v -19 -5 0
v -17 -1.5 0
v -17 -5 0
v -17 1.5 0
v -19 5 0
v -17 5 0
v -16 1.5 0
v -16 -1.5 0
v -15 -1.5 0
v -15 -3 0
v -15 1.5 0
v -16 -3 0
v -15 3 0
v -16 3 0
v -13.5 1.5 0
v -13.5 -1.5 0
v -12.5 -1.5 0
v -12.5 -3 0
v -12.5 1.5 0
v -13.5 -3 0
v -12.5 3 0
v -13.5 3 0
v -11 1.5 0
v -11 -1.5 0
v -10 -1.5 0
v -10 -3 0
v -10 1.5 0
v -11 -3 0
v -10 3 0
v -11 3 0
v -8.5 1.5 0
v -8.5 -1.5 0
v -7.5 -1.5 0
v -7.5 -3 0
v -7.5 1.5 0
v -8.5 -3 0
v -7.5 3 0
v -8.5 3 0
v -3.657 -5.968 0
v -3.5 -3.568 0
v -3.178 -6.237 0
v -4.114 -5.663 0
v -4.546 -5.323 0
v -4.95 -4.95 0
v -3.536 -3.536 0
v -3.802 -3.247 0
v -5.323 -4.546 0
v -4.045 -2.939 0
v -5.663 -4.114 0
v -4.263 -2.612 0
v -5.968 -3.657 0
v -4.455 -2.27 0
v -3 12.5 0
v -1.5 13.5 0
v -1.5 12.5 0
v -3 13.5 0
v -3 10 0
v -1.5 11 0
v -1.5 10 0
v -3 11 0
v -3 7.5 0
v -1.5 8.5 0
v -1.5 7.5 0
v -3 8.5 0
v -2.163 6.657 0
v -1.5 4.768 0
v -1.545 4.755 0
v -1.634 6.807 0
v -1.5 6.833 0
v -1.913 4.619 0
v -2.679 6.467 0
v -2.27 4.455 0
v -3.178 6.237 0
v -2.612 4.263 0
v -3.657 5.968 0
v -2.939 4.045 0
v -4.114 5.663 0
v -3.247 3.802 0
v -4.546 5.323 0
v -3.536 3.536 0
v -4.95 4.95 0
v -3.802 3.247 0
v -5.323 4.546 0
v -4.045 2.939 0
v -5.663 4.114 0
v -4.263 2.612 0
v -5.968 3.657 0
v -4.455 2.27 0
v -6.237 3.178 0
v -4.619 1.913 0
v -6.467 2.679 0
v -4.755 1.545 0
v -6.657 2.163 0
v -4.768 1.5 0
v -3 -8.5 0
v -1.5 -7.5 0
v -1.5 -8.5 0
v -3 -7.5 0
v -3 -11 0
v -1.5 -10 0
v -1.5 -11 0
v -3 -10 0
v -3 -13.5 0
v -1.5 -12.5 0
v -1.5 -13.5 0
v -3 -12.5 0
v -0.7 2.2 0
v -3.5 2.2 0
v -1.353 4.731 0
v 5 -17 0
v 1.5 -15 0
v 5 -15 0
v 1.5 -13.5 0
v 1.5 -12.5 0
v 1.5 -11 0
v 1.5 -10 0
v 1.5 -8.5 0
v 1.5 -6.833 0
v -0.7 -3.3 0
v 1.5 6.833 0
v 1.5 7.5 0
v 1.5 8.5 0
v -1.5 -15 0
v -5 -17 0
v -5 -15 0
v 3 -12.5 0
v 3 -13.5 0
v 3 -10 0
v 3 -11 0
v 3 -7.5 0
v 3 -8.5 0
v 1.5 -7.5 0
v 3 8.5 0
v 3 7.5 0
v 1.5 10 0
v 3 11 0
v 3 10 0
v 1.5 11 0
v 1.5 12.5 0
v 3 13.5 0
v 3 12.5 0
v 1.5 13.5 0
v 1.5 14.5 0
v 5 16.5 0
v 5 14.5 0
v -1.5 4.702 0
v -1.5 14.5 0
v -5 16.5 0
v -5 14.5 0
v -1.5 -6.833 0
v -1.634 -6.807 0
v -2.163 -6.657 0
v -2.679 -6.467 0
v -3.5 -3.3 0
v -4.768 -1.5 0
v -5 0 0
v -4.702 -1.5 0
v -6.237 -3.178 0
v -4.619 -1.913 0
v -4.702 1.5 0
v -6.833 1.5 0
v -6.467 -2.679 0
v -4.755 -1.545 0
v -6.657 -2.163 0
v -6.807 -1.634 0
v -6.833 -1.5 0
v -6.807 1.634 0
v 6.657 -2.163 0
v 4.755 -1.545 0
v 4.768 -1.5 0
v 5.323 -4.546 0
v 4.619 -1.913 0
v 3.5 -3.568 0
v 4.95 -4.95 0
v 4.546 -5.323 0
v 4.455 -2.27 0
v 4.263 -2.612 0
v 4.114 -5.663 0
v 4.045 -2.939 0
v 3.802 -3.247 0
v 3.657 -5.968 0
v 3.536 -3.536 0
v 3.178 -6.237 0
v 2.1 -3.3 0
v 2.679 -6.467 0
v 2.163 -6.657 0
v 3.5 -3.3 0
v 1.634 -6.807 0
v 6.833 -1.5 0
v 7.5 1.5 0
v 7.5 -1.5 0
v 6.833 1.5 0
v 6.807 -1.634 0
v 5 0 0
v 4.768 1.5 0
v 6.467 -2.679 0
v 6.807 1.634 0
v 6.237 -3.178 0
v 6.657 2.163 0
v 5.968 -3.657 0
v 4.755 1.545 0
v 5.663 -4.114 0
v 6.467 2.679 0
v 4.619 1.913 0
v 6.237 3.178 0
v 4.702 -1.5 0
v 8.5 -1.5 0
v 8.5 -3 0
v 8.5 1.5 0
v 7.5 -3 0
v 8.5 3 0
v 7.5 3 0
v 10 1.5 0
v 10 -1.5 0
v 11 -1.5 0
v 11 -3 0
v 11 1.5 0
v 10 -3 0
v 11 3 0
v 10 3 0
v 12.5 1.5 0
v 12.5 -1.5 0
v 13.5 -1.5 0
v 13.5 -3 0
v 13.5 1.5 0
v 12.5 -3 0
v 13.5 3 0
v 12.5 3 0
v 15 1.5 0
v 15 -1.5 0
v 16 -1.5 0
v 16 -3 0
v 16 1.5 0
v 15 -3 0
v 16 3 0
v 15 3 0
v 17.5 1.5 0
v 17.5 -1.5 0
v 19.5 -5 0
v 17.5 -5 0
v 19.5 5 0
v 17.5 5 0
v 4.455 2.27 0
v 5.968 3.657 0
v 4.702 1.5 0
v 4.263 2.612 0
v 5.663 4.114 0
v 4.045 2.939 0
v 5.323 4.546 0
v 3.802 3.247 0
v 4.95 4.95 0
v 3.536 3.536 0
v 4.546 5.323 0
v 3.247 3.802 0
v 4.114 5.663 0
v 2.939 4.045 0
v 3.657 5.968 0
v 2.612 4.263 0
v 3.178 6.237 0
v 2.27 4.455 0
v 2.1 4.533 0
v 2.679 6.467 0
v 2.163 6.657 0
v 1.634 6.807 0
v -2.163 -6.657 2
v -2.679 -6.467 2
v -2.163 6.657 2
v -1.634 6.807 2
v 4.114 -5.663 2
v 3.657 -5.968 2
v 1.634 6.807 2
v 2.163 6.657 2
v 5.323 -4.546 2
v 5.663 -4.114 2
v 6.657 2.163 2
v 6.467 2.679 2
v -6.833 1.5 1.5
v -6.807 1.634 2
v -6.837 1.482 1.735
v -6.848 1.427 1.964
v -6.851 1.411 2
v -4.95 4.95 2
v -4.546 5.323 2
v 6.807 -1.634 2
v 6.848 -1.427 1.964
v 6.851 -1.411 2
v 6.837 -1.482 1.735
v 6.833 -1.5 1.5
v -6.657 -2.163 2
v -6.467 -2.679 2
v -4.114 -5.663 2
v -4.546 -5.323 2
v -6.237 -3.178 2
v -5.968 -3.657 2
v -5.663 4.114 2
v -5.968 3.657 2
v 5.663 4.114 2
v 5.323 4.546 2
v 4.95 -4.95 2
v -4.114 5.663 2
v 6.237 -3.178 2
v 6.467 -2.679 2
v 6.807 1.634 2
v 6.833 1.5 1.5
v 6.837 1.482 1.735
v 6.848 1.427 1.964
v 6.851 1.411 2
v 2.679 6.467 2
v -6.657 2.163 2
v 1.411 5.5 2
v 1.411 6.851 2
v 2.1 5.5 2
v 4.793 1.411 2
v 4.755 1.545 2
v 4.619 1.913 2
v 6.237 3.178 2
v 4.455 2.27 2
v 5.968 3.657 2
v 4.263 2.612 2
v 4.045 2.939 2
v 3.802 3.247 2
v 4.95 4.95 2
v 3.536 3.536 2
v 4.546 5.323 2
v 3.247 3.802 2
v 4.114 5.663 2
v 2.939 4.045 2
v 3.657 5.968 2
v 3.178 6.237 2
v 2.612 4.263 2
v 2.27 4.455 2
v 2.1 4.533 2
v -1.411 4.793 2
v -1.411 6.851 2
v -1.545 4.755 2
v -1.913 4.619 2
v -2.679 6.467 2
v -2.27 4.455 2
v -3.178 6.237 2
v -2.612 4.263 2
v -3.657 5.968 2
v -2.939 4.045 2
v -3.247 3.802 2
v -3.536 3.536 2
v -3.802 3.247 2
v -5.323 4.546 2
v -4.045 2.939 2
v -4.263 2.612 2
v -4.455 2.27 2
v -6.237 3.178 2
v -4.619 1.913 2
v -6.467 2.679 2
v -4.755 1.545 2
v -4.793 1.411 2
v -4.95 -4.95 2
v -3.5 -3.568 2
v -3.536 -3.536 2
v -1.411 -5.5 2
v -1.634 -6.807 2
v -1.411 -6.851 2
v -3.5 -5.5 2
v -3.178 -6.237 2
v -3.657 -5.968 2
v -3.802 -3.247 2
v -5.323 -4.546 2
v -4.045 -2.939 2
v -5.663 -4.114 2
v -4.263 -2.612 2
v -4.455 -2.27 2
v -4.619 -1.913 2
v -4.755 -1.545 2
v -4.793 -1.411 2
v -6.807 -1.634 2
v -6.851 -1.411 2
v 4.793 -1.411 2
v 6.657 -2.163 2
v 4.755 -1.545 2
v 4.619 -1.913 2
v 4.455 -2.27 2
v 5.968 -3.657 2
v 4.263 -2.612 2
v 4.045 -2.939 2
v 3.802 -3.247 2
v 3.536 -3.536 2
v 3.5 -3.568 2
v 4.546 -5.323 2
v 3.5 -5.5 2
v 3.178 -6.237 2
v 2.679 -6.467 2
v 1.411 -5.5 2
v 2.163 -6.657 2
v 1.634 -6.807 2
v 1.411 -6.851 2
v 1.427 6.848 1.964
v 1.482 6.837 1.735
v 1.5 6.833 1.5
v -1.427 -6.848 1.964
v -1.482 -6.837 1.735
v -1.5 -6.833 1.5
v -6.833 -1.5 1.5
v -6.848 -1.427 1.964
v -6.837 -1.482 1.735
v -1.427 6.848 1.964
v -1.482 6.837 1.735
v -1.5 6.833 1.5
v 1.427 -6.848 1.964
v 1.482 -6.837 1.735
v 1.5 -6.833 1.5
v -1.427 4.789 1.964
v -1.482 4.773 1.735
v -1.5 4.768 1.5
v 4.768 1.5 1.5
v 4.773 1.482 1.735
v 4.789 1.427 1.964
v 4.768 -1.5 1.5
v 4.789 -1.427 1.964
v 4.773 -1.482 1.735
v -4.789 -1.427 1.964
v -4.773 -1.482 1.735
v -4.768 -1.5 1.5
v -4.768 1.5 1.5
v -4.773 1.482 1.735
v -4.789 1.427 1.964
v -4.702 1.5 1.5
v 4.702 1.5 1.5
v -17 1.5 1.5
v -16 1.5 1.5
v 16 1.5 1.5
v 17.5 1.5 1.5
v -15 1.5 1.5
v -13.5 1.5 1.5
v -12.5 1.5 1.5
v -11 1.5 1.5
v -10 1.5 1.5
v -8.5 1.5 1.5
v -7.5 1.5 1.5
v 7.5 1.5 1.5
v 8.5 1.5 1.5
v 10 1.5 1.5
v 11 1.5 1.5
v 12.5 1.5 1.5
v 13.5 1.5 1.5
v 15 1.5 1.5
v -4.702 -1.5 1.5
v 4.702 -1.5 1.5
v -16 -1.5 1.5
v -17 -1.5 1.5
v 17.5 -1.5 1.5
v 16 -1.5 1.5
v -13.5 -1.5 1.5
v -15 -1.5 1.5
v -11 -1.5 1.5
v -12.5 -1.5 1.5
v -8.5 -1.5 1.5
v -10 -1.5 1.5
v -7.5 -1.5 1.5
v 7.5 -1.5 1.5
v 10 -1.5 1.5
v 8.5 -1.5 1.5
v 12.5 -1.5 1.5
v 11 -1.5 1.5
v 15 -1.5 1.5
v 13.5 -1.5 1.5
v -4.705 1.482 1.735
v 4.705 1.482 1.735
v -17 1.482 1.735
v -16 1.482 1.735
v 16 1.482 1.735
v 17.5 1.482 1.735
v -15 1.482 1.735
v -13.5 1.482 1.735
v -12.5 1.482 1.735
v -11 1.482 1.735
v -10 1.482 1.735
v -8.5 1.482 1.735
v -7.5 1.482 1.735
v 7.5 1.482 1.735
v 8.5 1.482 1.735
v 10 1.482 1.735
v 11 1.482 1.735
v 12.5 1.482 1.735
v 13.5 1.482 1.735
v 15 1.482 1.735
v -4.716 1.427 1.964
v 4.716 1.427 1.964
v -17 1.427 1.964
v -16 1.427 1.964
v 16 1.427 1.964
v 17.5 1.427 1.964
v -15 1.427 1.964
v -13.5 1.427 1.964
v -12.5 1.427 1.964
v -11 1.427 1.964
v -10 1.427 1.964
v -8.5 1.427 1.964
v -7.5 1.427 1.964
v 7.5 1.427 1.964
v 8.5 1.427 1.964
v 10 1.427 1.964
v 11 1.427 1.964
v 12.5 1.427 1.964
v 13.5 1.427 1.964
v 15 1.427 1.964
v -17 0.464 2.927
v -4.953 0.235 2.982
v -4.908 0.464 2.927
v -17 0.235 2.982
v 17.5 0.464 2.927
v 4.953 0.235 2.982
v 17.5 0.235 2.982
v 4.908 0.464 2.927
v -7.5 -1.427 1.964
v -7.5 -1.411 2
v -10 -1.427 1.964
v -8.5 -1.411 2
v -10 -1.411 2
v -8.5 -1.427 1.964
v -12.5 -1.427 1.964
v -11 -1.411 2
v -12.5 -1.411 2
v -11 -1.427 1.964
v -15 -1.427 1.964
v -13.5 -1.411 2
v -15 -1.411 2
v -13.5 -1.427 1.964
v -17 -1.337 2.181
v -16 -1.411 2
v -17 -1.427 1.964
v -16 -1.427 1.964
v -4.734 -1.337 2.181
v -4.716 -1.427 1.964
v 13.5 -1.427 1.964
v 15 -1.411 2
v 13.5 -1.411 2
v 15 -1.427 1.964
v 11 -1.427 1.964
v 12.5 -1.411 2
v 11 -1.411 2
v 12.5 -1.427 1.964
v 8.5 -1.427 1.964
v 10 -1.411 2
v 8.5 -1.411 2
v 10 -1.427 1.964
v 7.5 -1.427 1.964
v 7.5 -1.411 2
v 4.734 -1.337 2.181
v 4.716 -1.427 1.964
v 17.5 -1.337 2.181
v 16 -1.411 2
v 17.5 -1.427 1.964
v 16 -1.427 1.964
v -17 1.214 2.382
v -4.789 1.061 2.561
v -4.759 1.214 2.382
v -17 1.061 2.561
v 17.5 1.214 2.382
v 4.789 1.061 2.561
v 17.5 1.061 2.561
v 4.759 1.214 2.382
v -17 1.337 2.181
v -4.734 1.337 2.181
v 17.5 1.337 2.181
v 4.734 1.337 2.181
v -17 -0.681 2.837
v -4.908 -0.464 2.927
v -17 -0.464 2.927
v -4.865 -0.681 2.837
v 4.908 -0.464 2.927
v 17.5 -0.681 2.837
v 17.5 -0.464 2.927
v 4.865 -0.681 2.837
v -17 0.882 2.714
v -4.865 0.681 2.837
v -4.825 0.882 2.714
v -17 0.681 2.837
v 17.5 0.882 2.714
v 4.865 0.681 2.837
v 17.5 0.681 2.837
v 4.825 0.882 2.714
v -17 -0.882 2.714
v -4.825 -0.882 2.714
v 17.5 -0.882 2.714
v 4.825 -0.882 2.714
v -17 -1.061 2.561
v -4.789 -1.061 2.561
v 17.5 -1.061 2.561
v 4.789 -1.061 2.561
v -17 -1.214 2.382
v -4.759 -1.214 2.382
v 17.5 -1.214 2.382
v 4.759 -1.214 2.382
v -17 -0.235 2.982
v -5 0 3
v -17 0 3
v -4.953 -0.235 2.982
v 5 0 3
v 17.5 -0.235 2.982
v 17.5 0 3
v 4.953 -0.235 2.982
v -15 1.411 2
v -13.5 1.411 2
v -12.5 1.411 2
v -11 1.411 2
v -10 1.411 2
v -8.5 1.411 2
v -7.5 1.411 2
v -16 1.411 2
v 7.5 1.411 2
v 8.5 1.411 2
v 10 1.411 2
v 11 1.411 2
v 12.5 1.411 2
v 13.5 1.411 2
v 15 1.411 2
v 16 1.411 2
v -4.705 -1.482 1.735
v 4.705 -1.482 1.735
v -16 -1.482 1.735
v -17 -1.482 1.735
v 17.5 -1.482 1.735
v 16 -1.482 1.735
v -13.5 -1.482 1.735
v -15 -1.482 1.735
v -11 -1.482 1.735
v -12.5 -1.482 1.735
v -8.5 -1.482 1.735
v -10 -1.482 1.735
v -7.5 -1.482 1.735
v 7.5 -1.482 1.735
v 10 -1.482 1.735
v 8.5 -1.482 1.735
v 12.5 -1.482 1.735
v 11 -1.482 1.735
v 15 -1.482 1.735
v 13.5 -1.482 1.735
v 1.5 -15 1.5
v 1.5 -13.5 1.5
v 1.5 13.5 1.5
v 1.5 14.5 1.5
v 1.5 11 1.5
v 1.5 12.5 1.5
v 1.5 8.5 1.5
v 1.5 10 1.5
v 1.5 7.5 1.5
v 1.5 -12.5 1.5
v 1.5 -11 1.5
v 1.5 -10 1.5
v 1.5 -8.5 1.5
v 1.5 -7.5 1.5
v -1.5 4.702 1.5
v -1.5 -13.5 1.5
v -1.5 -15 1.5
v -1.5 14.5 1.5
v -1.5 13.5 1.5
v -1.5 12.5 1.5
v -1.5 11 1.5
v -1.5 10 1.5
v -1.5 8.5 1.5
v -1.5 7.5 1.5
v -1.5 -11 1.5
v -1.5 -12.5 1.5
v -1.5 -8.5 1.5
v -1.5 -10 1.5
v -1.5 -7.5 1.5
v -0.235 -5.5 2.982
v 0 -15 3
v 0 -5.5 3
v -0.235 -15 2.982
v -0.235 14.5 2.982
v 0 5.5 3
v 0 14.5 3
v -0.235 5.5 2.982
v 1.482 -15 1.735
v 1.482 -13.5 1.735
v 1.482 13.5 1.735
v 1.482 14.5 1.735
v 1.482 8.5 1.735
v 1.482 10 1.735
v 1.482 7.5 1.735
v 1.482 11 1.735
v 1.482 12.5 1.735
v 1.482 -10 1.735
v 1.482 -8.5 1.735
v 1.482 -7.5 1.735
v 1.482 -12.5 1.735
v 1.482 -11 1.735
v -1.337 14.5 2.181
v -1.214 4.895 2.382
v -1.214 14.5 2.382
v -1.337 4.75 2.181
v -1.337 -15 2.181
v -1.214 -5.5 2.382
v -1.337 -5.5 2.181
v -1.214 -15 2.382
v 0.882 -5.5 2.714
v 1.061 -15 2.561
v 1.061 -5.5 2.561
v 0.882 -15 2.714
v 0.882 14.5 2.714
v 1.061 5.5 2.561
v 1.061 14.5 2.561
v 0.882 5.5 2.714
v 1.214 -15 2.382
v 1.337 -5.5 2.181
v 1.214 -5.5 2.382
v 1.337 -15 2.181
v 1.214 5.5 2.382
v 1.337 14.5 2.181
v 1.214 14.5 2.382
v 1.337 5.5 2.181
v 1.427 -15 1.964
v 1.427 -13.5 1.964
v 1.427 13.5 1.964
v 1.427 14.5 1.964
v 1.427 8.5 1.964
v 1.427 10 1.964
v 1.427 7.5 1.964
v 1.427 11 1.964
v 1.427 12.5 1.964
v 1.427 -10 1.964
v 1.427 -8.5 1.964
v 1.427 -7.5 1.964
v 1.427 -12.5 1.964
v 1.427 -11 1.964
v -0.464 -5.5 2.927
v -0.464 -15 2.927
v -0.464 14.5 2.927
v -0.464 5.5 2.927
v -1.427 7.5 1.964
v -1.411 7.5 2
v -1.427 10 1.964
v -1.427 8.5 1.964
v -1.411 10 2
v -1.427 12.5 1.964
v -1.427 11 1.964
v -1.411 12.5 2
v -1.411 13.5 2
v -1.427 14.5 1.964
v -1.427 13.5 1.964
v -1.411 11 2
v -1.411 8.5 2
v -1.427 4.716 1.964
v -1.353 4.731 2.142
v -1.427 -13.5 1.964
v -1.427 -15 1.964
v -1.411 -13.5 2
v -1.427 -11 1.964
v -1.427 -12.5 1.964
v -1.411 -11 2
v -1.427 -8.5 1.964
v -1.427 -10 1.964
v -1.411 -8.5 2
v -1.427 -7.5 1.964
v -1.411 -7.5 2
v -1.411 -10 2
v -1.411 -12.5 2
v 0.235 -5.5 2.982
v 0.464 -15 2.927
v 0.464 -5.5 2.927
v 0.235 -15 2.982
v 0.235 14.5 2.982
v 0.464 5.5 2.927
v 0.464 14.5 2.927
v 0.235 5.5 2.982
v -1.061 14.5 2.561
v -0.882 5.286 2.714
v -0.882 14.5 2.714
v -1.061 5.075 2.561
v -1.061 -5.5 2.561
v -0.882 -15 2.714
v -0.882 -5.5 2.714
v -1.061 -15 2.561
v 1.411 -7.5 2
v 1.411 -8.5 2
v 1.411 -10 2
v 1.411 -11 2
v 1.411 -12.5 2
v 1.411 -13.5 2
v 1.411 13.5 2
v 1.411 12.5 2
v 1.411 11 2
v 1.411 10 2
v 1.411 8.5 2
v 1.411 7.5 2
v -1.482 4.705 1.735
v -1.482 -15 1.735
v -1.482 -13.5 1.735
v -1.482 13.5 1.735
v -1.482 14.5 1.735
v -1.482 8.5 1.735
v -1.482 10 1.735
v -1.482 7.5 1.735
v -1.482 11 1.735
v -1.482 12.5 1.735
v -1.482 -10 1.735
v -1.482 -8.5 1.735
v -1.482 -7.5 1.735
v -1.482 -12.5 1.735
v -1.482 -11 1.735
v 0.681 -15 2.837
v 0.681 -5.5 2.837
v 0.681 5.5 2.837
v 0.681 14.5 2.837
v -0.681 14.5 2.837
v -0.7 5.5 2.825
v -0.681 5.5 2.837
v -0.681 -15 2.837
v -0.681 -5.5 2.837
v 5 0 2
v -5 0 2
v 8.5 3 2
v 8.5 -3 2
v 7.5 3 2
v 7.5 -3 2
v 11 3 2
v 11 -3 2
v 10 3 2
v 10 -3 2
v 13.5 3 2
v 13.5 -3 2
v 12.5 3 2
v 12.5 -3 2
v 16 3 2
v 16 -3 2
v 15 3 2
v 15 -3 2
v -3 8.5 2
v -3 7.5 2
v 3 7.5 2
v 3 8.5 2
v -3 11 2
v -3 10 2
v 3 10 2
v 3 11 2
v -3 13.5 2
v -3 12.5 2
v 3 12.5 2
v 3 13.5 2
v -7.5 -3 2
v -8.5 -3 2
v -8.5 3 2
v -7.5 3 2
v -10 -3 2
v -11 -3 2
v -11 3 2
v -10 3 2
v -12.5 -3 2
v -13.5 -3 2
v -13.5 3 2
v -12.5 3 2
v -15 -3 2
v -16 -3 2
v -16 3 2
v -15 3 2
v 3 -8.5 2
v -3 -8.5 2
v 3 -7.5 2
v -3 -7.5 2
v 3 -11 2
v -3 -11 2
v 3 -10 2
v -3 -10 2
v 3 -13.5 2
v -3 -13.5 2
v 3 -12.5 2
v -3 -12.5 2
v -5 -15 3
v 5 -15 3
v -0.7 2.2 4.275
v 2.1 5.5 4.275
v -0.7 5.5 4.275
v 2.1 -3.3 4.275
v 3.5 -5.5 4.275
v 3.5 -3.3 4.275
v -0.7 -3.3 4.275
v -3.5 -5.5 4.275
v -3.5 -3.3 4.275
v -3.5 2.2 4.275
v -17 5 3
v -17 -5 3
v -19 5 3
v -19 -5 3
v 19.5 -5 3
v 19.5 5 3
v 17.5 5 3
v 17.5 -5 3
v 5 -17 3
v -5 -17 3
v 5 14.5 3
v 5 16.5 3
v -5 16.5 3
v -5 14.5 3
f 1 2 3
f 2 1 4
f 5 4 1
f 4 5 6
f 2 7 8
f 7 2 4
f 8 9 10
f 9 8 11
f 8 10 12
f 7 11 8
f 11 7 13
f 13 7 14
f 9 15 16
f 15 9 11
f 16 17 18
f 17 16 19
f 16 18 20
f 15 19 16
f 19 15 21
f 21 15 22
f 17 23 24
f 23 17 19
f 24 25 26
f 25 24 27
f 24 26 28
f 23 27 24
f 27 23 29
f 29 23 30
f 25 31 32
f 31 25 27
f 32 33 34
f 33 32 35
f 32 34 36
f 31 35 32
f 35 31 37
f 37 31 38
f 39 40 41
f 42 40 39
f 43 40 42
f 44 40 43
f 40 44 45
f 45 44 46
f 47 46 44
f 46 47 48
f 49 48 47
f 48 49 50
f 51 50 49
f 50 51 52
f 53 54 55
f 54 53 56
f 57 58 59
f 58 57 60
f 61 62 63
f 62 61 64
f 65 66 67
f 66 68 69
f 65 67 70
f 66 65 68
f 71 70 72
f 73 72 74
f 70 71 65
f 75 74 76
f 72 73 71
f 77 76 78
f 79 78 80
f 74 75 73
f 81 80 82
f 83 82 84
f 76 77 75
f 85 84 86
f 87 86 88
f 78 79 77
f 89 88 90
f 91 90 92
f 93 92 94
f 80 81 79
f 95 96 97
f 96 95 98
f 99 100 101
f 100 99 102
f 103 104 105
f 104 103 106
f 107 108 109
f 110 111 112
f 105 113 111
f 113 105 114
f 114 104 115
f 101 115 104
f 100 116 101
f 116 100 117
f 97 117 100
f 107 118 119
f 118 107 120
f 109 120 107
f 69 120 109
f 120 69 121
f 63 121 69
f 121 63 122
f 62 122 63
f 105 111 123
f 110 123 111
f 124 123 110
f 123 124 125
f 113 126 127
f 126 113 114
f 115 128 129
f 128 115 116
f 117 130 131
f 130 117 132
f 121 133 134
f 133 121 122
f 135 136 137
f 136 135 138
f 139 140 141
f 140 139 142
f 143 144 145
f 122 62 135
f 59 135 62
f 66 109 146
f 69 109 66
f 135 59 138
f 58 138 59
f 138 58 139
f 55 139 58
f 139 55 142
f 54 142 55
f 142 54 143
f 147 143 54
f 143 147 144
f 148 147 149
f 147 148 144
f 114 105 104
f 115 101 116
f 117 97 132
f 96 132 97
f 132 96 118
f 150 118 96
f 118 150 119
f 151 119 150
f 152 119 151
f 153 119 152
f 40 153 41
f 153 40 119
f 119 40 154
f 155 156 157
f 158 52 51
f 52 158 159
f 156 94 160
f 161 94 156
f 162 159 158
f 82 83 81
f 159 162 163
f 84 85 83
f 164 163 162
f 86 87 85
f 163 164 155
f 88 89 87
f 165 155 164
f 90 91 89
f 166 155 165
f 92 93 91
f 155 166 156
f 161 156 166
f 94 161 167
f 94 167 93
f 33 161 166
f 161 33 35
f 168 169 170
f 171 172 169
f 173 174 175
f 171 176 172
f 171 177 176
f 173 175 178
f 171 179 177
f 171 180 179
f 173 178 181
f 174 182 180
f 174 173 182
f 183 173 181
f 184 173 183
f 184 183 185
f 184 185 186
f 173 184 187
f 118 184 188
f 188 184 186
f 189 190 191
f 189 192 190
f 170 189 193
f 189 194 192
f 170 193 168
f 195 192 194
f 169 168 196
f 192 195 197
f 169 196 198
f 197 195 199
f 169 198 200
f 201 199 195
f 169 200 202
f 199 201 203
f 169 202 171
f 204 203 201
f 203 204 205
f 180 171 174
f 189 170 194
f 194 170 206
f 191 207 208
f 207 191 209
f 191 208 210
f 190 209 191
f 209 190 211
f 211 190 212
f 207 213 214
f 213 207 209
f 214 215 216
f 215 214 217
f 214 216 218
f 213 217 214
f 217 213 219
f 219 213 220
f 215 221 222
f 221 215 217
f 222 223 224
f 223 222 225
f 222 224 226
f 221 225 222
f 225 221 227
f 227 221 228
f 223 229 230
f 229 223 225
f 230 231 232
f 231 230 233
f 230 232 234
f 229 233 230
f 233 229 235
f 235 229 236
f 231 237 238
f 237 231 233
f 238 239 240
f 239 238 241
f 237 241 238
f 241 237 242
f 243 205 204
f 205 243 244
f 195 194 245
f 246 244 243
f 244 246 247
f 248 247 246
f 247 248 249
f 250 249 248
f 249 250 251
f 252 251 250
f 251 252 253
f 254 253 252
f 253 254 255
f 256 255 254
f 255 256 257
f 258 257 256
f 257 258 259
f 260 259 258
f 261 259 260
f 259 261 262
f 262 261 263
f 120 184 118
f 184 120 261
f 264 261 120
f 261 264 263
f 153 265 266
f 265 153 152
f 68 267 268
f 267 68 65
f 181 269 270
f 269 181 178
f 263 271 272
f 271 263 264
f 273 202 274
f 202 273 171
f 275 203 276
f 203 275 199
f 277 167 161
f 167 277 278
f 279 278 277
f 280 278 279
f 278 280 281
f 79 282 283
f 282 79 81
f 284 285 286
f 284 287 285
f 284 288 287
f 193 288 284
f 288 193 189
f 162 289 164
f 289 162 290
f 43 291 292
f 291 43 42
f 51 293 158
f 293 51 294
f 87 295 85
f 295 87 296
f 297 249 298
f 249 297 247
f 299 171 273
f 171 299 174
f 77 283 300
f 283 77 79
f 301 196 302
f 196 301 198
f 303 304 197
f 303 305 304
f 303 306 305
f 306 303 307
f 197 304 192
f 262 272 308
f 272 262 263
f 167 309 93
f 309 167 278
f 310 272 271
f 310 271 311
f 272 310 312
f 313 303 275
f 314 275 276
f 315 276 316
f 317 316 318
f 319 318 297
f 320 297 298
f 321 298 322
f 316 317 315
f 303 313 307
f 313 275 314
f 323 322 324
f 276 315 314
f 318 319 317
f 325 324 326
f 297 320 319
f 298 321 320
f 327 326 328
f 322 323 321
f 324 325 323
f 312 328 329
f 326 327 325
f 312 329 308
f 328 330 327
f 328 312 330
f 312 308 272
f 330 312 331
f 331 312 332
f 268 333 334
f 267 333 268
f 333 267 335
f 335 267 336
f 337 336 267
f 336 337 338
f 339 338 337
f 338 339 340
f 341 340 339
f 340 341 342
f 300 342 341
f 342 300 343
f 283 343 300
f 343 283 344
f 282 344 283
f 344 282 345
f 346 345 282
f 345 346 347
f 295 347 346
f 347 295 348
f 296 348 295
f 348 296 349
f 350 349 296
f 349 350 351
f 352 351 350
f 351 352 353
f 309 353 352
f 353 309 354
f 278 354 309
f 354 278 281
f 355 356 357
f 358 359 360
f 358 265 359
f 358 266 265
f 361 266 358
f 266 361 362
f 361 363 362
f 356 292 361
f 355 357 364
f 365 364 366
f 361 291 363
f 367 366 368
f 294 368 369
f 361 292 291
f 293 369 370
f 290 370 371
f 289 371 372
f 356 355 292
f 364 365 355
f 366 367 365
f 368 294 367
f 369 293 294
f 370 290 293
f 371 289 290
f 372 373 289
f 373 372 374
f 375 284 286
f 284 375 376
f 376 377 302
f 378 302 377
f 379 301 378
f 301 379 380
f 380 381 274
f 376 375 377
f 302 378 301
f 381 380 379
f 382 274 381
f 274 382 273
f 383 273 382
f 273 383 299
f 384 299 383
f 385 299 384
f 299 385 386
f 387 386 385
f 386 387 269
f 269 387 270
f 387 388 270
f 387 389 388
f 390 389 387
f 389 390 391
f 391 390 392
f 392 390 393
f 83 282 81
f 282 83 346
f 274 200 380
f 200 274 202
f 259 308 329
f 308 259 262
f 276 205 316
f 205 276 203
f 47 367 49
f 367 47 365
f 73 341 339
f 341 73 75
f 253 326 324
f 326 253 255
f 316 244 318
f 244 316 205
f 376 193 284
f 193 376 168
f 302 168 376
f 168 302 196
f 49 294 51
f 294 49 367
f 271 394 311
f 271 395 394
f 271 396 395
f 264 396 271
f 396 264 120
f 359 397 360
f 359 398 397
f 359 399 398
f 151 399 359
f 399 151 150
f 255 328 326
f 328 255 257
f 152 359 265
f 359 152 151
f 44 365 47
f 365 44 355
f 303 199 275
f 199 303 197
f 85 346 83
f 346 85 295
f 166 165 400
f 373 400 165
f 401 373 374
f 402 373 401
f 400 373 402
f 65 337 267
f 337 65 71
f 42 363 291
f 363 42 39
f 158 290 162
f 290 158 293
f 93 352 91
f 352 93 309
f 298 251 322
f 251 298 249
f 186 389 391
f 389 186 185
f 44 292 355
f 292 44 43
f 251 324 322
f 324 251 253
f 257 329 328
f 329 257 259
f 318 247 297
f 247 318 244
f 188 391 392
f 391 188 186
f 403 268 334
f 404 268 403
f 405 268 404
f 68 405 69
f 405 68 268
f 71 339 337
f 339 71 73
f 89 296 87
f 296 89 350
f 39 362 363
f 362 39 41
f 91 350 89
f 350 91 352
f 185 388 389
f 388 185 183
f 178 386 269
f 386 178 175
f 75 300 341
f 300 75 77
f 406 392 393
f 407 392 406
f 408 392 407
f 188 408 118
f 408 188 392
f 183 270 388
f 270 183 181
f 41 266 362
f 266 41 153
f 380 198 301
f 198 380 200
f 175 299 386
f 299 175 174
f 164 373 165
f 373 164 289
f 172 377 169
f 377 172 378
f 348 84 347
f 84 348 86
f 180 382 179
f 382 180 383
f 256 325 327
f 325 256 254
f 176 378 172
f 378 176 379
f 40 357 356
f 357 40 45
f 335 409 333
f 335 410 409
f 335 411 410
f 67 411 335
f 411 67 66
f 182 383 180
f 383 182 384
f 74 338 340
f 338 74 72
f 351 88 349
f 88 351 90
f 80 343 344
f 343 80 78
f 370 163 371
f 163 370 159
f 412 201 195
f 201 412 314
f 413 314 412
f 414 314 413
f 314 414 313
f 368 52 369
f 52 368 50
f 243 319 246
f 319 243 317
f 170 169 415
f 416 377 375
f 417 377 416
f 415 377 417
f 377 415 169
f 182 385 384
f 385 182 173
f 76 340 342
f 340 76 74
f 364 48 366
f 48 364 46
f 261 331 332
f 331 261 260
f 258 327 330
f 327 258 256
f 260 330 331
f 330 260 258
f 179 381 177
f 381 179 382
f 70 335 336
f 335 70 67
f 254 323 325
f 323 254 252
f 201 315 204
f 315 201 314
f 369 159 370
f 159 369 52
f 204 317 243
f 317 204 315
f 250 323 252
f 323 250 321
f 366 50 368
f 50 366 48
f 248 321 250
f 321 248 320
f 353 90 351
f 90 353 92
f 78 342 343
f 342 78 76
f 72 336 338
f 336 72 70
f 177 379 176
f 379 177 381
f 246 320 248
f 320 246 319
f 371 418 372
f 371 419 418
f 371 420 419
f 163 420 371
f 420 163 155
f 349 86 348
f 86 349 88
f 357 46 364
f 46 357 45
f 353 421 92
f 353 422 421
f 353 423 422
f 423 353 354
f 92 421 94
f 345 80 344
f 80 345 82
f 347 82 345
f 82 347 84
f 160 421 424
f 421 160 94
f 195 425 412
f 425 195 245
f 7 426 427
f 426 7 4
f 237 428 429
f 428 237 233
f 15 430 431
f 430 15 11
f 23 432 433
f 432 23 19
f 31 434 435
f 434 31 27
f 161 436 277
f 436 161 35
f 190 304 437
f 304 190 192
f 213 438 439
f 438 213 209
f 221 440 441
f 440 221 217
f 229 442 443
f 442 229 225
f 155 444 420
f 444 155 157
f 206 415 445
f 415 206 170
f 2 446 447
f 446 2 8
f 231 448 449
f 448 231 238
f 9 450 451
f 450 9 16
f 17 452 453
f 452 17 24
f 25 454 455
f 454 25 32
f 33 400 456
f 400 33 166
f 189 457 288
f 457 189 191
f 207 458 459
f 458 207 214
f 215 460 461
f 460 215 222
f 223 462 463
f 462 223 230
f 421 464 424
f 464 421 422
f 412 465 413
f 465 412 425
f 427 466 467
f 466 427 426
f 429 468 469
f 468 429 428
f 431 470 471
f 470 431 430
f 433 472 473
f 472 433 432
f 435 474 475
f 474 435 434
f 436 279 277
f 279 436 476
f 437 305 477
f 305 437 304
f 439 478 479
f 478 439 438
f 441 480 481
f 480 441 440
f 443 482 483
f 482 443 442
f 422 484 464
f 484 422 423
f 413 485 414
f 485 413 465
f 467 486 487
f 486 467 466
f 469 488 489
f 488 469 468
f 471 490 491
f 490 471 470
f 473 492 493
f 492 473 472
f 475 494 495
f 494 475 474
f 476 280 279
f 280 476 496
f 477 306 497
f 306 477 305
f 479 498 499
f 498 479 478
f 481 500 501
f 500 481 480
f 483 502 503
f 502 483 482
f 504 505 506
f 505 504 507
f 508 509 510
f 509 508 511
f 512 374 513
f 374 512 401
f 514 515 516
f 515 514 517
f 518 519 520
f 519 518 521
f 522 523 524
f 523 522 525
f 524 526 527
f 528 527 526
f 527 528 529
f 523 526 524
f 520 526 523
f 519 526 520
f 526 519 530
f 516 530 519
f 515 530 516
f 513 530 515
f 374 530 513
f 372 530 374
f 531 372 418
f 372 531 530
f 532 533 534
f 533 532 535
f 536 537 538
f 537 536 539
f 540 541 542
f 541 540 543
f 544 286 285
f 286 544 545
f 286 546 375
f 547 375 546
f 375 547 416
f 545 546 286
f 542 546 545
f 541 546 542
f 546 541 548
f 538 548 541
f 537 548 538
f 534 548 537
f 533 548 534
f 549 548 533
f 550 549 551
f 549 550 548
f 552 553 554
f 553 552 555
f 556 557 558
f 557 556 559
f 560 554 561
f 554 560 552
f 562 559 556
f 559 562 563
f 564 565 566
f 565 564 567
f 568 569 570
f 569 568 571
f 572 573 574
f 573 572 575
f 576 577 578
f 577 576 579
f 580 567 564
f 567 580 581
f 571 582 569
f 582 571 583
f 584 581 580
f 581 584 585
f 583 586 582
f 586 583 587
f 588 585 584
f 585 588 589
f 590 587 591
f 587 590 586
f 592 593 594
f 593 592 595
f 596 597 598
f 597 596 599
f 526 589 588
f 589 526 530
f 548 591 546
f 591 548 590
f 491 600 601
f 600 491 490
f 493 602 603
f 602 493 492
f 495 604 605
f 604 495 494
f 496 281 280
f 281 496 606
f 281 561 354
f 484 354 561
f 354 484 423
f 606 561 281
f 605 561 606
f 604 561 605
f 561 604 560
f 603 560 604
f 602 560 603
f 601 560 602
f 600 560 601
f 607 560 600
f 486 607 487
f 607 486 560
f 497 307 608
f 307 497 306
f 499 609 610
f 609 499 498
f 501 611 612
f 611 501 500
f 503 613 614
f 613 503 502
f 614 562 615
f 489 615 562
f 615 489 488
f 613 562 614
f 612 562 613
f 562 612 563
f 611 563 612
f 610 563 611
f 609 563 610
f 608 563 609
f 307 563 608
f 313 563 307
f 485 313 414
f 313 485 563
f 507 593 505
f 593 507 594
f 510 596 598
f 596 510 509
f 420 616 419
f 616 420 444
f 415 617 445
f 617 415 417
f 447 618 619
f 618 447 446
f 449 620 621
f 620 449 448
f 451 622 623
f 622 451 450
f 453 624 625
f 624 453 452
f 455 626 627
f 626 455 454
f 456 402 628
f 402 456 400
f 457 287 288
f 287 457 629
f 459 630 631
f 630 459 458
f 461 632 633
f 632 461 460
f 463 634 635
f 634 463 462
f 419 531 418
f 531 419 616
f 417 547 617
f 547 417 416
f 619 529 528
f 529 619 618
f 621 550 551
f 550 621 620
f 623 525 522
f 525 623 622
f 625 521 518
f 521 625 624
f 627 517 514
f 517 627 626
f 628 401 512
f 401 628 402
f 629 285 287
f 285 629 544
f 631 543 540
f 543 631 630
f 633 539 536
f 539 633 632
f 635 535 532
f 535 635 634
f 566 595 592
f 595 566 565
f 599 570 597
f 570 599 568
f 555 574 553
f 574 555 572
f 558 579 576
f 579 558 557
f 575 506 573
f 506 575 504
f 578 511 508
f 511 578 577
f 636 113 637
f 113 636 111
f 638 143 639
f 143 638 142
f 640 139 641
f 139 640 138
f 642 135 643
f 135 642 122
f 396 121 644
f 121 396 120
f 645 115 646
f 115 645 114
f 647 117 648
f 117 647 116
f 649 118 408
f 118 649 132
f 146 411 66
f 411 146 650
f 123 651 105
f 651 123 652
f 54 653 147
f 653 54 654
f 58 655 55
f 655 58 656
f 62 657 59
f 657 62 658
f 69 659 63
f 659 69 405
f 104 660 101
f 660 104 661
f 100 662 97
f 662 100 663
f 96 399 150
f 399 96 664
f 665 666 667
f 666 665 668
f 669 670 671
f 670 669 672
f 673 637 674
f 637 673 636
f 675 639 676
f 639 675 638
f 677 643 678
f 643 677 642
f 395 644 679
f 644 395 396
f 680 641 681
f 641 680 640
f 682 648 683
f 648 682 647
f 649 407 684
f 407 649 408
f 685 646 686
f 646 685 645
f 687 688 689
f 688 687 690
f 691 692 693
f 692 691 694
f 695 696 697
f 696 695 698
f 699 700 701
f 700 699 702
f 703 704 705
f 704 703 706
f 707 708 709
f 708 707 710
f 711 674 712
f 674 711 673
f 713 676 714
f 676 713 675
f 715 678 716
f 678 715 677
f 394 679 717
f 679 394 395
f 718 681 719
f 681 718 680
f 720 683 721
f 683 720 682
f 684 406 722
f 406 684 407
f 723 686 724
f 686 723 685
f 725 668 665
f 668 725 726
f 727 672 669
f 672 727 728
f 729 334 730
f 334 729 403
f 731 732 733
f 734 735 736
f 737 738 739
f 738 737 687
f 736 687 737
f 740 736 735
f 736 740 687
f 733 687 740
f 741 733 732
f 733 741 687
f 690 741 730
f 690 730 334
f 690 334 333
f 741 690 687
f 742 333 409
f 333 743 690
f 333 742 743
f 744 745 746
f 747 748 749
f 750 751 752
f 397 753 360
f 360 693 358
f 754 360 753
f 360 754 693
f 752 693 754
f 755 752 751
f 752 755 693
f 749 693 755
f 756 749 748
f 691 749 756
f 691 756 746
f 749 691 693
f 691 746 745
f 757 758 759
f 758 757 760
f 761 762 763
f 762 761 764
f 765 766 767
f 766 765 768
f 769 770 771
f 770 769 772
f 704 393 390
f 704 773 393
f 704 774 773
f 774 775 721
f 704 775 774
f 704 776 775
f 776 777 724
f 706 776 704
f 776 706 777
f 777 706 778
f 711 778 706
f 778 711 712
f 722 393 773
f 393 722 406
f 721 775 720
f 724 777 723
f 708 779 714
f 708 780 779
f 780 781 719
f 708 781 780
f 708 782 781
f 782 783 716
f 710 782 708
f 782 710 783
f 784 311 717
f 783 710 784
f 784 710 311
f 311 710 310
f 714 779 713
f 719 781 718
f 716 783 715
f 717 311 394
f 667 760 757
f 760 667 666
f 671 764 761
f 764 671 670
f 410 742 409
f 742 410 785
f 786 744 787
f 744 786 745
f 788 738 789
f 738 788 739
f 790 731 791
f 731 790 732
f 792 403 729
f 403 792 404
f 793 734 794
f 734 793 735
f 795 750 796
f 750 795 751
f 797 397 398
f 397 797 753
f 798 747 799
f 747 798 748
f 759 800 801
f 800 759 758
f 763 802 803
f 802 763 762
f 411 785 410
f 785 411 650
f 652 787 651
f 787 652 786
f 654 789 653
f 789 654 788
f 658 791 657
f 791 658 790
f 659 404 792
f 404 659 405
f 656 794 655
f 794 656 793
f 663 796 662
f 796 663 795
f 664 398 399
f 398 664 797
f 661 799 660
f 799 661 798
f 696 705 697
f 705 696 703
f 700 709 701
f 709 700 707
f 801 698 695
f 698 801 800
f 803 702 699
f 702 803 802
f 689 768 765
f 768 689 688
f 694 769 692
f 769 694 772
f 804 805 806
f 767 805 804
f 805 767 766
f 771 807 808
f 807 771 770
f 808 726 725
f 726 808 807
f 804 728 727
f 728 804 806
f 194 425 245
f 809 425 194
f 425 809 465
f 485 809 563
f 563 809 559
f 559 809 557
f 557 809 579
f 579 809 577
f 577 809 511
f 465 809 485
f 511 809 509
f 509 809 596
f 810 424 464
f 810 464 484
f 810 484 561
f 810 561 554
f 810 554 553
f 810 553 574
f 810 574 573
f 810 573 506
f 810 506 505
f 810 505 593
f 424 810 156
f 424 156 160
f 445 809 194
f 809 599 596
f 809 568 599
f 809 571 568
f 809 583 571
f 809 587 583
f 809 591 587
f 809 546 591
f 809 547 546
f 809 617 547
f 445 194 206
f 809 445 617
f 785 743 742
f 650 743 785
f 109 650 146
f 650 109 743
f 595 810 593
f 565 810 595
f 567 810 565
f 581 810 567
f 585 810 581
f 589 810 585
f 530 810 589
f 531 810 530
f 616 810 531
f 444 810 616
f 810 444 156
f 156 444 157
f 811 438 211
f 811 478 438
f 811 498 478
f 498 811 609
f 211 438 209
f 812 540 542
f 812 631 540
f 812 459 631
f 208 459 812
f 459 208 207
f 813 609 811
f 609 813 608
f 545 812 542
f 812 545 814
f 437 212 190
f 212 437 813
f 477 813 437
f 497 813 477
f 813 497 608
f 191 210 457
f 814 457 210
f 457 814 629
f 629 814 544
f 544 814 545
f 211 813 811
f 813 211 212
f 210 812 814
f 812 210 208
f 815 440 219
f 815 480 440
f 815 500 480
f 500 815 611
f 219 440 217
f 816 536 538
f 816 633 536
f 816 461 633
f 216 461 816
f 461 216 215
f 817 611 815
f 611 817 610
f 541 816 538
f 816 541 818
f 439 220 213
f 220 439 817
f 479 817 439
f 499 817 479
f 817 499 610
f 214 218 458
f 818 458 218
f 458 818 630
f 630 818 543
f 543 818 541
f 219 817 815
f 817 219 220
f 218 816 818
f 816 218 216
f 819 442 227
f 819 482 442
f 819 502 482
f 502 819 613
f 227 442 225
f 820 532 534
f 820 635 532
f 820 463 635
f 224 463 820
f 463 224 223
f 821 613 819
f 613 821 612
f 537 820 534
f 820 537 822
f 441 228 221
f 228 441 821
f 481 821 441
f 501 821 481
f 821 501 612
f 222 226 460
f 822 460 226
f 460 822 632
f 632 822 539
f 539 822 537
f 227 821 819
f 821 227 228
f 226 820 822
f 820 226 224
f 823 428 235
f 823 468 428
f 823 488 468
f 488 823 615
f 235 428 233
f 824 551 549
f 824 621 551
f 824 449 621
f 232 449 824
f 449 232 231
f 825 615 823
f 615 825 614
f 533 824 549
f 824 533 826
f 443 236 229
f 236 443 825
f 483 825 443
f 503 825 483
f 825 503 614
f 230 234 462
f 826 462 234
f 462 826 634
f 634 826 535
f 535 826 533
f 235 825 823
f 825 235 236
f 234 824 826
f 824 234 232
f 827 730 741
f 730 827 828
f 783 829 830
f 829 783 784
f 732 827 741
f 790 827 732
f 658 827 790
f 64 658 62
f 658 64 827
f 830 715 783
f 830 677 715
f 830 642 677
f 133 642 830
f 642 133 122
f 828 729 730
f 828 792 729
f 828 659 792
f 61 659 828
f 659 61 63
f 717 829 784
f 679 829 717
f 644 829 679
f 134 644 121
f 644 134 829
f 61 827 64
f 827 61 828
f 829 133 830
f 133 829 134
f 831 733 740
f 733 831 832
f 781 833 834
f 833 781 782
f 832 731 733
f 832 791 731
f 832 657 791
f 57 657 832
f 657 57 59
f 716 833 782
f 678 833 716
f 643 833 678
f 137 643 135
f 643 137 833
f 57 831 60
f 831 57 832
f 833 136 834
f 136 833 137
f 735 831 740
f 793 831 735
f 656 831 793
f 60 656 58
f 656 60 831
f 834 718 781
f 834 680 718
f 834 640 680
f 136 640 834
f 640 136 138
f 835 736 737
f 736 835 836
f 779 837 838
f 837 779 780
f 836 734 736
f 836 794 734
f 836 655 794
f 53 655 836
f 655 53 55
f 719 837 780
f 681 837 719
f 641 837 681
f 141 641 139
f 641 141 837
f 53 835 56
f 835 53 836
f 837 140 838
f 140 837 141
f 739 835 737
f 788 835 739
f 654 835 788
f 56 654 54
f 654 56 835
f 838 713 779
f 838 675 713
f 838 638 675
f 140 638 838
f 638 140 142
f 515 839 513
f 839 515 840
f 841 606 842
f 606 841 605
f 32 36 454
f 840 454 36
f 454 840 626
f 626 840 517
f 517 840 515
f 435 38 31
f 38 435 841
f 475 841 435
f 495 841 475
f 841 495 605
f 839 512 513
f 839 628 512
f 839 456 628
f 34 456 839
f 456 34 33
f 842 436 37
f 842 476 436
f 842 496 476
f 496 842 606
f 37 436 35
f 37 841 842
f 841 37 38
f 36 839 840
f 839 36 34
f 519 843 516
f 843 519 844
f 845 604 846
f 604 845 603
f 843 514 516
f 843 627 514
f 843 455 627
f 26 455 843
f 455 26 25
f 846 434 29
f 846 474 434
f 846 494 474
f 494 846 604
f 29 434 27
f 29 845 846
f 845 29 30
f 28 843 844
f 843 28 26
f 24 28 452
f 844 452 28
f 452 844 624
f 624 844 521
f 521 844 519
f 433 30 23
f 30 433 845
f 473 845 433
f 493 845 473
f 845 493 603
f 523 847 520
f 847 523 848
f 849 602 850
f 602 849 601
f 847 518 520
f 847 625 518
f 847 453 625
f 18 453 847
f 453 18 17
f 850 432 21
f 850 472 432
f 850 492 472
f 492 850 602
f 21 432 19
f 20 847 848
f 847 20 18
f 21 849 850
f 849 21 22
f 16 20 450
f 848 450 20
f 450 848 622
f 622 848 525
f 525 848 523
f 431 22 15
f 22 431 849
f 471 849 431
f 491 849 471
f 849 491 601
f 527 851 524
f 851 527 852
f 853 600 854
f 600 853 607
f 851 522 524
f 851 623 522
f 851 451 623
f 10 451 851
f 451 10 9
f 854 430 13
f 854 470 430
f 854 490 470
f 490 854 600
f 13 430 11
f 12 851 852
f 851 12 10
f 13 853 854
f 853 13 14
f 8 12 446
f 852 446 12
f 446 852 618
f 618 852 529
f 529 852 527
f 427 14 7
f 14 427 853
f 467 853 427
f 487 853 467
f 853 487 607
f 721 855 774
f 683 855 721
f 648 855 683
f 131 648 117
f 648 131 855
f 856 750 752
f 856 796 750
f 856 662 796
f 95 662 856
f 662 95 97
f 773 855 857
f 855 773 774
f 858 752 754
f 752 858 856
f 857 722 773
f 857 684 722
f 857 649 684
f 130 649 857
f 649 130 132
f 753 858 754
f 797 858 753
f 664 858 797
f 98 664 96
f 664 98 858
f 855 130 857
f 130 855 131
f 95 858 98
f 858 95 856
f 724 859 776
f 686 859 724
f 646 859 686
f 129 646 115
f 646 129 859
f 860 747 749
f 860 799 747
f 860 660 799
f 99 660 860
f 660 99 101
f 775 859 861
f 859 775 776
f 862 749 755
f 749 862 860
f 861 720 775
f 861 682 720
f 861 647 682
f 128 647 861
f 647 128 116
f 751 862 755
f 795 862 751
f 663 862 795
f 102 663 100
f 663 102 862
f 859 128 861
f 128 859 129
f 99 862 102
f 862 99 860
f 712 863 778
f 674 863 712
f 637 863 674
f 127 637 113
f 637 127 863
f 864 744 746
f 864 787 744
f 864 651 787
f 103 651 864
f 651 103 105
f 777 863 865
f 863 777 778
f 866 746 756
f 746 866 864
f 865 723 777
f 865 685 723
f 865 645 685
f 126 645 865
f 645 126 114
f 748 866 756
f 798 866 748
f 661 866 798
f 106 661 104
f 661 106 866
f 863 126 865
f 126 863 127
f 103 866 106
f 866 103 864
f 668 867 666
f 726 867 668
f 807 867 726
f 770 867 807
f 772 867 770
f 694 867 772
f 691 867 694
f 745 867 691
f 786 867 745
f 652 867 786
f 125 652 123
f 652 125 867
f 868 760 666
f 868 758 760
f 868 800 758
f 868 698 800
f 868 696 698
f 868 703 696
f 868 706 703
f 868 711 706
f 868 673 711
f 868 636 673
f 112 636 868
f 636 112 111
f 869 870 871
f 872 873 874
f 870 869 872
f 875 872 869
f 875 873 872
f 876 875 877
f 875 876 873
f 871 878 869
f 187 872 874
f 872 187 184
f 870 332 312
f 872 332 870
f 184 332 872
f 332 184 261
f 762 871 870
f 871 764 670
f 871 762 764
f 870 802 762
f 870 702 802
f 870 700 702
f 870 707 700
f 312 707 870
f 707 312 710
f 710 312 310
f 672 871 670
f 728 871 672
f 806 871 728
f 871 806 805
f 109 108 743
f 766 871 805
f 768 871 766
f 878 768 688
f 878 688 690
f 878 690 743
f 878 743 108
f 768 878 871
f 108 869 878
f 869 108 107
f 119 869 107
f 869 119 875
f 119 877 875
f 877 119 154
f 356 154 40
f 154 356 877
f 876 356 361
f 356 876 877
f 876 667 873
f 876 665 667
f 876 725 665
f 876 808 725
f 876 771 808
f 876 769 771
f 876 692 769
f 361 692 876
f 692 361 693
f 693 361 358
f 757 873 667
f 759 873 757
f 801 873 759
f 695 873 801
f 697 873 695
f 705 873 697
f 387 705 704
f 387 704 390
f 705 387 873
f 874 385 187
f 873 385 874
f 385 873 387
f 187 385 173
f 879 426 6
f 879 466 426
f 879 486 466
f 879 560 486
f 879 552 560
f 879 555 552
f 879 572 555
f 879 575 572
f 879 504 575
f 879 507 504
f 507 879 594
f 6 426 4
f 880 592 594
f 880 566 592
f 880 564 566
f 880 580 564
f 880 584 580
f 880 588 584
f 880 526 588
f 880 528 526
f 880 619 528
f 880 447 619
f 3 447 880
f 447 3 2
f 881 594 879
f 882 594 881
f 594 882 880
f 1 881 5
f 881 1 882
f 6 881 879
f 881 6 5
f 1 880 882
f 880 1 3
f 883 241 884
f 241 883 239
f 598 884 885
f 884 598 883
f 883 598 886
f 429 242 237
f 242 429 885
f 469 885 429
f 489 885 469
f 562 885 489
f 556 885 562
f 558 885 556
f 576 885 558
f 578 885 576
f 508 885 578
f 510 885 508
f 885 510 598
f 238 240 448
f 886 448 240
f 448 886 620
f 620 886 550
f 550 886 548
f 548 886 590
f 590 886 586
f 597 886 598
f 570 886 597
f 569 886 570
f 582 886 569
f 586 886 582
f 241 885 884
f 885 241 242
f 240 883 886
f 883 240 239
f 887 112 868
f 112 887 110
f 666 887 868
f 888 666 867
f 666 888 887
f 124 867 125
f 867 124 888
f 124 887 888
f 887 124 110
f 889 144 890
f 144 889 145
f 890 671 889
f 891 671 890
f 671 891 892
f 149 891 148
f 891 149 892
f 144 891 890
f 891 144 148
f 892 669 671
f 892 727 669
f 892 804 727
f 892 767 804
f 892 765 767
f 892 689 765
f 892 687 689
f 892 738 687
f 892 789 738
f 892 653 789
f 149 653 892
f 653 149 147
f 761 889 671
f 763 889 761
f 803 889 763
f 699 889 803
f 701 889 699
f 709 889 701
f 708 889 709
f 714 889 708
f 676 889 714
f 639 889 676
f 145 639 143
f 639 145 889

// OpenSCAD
// file: spiff.scad
include <spiffsans.scad>

// https://github.com/stuartpb/Spiff.scad

module write(string,font=spiffsans,spacing=1,i=0) {
  if (i < len(string)) {
    assign(charindex = search(string[i],font,1)[0])
    
    // If the character is in the font
    if (charindex != undef) {
      assign(glyph = font[charindex][2])
      if (glyph){
        polygon(points=glyph[0], paths=glyph[1]);
      }
      translate([font[charindex][1] + spacing, 0, 0])
        write(string, font, spacing, i=i+1);
    } else {
      assign(glyph = font[0][2])
      if (glyph){
        polygon(points=glyph[0], paths=glyph[1]);
      }
      translate([font[0][1] + spacing,0,0])
        write(string, font, spacing, i=i+1);
    }
  }
}
// main file
include <spiff.scad>

lock_number_strings = ["1", "2", "3", "4", "5", "6", "7", "8", "9"];
lock_number_widths  = [5, 6, 6, 6, 6, 6, 5, 6, 6];
lock_number_heights = [10, 10, 10, 10, 10, 10, 10, 10, 10];

target_lock(0);

module target_lock(index) {

difference() {
	cylinder(h = 2, r = 7, $fn = 80);
	translate([0, 0, -0.5]) cylinder(h = 10, r = 5, $fn = 80);
}

scale([1.4, 1.1, 0.9]) {
translate([
	-(lock_number_widths[index] / 2),
	-(lock_number_heights[index] / 2),
	0
])
{
	linear_extrude(height = 4.75) {
		write(lock_number_strings[index]);
	}
}
}

difference() {
	union() {
		translate([-18.5, -1.5, 0]) {
			cube([37, 3, 1.5]);
			translate([0, 1.5, 1.5]) rotate([0, 90, 0]) cylinder(h = 37, r = 1.5, $fn = 40);
		}
		translate([-1.5, -16, 0]) {
			cube([3, 32, 1.5]);
			translate([1.5, 0, 1.5]) rotate([-90, 0, 0]) cylinder(h = 32, r = 1.5, $fn = 40);
		}
	}
	translate([0, 0, -1]) cylinder(h = 10, r = 5);
}

for (quadrant = [0:3]) for (grid = [0:4]) {
	rotate([0, 0, quadrant * 90]) {
		translate([5 + (2.5 * grid), -3, 0]) cube([1, 6, 2]);
	}
}
translate([-19, -5, 0]) cube([2, 10, 3]);
translate([17.5, -5, 0]) cube([2, 10, 3]);
translate([-5, -17, 0]) cube([10, 2, 3]);
translate([-5, 14.5, 0]) cube([10, 2, 3]);

}

// cube([10, 10, 10]);
